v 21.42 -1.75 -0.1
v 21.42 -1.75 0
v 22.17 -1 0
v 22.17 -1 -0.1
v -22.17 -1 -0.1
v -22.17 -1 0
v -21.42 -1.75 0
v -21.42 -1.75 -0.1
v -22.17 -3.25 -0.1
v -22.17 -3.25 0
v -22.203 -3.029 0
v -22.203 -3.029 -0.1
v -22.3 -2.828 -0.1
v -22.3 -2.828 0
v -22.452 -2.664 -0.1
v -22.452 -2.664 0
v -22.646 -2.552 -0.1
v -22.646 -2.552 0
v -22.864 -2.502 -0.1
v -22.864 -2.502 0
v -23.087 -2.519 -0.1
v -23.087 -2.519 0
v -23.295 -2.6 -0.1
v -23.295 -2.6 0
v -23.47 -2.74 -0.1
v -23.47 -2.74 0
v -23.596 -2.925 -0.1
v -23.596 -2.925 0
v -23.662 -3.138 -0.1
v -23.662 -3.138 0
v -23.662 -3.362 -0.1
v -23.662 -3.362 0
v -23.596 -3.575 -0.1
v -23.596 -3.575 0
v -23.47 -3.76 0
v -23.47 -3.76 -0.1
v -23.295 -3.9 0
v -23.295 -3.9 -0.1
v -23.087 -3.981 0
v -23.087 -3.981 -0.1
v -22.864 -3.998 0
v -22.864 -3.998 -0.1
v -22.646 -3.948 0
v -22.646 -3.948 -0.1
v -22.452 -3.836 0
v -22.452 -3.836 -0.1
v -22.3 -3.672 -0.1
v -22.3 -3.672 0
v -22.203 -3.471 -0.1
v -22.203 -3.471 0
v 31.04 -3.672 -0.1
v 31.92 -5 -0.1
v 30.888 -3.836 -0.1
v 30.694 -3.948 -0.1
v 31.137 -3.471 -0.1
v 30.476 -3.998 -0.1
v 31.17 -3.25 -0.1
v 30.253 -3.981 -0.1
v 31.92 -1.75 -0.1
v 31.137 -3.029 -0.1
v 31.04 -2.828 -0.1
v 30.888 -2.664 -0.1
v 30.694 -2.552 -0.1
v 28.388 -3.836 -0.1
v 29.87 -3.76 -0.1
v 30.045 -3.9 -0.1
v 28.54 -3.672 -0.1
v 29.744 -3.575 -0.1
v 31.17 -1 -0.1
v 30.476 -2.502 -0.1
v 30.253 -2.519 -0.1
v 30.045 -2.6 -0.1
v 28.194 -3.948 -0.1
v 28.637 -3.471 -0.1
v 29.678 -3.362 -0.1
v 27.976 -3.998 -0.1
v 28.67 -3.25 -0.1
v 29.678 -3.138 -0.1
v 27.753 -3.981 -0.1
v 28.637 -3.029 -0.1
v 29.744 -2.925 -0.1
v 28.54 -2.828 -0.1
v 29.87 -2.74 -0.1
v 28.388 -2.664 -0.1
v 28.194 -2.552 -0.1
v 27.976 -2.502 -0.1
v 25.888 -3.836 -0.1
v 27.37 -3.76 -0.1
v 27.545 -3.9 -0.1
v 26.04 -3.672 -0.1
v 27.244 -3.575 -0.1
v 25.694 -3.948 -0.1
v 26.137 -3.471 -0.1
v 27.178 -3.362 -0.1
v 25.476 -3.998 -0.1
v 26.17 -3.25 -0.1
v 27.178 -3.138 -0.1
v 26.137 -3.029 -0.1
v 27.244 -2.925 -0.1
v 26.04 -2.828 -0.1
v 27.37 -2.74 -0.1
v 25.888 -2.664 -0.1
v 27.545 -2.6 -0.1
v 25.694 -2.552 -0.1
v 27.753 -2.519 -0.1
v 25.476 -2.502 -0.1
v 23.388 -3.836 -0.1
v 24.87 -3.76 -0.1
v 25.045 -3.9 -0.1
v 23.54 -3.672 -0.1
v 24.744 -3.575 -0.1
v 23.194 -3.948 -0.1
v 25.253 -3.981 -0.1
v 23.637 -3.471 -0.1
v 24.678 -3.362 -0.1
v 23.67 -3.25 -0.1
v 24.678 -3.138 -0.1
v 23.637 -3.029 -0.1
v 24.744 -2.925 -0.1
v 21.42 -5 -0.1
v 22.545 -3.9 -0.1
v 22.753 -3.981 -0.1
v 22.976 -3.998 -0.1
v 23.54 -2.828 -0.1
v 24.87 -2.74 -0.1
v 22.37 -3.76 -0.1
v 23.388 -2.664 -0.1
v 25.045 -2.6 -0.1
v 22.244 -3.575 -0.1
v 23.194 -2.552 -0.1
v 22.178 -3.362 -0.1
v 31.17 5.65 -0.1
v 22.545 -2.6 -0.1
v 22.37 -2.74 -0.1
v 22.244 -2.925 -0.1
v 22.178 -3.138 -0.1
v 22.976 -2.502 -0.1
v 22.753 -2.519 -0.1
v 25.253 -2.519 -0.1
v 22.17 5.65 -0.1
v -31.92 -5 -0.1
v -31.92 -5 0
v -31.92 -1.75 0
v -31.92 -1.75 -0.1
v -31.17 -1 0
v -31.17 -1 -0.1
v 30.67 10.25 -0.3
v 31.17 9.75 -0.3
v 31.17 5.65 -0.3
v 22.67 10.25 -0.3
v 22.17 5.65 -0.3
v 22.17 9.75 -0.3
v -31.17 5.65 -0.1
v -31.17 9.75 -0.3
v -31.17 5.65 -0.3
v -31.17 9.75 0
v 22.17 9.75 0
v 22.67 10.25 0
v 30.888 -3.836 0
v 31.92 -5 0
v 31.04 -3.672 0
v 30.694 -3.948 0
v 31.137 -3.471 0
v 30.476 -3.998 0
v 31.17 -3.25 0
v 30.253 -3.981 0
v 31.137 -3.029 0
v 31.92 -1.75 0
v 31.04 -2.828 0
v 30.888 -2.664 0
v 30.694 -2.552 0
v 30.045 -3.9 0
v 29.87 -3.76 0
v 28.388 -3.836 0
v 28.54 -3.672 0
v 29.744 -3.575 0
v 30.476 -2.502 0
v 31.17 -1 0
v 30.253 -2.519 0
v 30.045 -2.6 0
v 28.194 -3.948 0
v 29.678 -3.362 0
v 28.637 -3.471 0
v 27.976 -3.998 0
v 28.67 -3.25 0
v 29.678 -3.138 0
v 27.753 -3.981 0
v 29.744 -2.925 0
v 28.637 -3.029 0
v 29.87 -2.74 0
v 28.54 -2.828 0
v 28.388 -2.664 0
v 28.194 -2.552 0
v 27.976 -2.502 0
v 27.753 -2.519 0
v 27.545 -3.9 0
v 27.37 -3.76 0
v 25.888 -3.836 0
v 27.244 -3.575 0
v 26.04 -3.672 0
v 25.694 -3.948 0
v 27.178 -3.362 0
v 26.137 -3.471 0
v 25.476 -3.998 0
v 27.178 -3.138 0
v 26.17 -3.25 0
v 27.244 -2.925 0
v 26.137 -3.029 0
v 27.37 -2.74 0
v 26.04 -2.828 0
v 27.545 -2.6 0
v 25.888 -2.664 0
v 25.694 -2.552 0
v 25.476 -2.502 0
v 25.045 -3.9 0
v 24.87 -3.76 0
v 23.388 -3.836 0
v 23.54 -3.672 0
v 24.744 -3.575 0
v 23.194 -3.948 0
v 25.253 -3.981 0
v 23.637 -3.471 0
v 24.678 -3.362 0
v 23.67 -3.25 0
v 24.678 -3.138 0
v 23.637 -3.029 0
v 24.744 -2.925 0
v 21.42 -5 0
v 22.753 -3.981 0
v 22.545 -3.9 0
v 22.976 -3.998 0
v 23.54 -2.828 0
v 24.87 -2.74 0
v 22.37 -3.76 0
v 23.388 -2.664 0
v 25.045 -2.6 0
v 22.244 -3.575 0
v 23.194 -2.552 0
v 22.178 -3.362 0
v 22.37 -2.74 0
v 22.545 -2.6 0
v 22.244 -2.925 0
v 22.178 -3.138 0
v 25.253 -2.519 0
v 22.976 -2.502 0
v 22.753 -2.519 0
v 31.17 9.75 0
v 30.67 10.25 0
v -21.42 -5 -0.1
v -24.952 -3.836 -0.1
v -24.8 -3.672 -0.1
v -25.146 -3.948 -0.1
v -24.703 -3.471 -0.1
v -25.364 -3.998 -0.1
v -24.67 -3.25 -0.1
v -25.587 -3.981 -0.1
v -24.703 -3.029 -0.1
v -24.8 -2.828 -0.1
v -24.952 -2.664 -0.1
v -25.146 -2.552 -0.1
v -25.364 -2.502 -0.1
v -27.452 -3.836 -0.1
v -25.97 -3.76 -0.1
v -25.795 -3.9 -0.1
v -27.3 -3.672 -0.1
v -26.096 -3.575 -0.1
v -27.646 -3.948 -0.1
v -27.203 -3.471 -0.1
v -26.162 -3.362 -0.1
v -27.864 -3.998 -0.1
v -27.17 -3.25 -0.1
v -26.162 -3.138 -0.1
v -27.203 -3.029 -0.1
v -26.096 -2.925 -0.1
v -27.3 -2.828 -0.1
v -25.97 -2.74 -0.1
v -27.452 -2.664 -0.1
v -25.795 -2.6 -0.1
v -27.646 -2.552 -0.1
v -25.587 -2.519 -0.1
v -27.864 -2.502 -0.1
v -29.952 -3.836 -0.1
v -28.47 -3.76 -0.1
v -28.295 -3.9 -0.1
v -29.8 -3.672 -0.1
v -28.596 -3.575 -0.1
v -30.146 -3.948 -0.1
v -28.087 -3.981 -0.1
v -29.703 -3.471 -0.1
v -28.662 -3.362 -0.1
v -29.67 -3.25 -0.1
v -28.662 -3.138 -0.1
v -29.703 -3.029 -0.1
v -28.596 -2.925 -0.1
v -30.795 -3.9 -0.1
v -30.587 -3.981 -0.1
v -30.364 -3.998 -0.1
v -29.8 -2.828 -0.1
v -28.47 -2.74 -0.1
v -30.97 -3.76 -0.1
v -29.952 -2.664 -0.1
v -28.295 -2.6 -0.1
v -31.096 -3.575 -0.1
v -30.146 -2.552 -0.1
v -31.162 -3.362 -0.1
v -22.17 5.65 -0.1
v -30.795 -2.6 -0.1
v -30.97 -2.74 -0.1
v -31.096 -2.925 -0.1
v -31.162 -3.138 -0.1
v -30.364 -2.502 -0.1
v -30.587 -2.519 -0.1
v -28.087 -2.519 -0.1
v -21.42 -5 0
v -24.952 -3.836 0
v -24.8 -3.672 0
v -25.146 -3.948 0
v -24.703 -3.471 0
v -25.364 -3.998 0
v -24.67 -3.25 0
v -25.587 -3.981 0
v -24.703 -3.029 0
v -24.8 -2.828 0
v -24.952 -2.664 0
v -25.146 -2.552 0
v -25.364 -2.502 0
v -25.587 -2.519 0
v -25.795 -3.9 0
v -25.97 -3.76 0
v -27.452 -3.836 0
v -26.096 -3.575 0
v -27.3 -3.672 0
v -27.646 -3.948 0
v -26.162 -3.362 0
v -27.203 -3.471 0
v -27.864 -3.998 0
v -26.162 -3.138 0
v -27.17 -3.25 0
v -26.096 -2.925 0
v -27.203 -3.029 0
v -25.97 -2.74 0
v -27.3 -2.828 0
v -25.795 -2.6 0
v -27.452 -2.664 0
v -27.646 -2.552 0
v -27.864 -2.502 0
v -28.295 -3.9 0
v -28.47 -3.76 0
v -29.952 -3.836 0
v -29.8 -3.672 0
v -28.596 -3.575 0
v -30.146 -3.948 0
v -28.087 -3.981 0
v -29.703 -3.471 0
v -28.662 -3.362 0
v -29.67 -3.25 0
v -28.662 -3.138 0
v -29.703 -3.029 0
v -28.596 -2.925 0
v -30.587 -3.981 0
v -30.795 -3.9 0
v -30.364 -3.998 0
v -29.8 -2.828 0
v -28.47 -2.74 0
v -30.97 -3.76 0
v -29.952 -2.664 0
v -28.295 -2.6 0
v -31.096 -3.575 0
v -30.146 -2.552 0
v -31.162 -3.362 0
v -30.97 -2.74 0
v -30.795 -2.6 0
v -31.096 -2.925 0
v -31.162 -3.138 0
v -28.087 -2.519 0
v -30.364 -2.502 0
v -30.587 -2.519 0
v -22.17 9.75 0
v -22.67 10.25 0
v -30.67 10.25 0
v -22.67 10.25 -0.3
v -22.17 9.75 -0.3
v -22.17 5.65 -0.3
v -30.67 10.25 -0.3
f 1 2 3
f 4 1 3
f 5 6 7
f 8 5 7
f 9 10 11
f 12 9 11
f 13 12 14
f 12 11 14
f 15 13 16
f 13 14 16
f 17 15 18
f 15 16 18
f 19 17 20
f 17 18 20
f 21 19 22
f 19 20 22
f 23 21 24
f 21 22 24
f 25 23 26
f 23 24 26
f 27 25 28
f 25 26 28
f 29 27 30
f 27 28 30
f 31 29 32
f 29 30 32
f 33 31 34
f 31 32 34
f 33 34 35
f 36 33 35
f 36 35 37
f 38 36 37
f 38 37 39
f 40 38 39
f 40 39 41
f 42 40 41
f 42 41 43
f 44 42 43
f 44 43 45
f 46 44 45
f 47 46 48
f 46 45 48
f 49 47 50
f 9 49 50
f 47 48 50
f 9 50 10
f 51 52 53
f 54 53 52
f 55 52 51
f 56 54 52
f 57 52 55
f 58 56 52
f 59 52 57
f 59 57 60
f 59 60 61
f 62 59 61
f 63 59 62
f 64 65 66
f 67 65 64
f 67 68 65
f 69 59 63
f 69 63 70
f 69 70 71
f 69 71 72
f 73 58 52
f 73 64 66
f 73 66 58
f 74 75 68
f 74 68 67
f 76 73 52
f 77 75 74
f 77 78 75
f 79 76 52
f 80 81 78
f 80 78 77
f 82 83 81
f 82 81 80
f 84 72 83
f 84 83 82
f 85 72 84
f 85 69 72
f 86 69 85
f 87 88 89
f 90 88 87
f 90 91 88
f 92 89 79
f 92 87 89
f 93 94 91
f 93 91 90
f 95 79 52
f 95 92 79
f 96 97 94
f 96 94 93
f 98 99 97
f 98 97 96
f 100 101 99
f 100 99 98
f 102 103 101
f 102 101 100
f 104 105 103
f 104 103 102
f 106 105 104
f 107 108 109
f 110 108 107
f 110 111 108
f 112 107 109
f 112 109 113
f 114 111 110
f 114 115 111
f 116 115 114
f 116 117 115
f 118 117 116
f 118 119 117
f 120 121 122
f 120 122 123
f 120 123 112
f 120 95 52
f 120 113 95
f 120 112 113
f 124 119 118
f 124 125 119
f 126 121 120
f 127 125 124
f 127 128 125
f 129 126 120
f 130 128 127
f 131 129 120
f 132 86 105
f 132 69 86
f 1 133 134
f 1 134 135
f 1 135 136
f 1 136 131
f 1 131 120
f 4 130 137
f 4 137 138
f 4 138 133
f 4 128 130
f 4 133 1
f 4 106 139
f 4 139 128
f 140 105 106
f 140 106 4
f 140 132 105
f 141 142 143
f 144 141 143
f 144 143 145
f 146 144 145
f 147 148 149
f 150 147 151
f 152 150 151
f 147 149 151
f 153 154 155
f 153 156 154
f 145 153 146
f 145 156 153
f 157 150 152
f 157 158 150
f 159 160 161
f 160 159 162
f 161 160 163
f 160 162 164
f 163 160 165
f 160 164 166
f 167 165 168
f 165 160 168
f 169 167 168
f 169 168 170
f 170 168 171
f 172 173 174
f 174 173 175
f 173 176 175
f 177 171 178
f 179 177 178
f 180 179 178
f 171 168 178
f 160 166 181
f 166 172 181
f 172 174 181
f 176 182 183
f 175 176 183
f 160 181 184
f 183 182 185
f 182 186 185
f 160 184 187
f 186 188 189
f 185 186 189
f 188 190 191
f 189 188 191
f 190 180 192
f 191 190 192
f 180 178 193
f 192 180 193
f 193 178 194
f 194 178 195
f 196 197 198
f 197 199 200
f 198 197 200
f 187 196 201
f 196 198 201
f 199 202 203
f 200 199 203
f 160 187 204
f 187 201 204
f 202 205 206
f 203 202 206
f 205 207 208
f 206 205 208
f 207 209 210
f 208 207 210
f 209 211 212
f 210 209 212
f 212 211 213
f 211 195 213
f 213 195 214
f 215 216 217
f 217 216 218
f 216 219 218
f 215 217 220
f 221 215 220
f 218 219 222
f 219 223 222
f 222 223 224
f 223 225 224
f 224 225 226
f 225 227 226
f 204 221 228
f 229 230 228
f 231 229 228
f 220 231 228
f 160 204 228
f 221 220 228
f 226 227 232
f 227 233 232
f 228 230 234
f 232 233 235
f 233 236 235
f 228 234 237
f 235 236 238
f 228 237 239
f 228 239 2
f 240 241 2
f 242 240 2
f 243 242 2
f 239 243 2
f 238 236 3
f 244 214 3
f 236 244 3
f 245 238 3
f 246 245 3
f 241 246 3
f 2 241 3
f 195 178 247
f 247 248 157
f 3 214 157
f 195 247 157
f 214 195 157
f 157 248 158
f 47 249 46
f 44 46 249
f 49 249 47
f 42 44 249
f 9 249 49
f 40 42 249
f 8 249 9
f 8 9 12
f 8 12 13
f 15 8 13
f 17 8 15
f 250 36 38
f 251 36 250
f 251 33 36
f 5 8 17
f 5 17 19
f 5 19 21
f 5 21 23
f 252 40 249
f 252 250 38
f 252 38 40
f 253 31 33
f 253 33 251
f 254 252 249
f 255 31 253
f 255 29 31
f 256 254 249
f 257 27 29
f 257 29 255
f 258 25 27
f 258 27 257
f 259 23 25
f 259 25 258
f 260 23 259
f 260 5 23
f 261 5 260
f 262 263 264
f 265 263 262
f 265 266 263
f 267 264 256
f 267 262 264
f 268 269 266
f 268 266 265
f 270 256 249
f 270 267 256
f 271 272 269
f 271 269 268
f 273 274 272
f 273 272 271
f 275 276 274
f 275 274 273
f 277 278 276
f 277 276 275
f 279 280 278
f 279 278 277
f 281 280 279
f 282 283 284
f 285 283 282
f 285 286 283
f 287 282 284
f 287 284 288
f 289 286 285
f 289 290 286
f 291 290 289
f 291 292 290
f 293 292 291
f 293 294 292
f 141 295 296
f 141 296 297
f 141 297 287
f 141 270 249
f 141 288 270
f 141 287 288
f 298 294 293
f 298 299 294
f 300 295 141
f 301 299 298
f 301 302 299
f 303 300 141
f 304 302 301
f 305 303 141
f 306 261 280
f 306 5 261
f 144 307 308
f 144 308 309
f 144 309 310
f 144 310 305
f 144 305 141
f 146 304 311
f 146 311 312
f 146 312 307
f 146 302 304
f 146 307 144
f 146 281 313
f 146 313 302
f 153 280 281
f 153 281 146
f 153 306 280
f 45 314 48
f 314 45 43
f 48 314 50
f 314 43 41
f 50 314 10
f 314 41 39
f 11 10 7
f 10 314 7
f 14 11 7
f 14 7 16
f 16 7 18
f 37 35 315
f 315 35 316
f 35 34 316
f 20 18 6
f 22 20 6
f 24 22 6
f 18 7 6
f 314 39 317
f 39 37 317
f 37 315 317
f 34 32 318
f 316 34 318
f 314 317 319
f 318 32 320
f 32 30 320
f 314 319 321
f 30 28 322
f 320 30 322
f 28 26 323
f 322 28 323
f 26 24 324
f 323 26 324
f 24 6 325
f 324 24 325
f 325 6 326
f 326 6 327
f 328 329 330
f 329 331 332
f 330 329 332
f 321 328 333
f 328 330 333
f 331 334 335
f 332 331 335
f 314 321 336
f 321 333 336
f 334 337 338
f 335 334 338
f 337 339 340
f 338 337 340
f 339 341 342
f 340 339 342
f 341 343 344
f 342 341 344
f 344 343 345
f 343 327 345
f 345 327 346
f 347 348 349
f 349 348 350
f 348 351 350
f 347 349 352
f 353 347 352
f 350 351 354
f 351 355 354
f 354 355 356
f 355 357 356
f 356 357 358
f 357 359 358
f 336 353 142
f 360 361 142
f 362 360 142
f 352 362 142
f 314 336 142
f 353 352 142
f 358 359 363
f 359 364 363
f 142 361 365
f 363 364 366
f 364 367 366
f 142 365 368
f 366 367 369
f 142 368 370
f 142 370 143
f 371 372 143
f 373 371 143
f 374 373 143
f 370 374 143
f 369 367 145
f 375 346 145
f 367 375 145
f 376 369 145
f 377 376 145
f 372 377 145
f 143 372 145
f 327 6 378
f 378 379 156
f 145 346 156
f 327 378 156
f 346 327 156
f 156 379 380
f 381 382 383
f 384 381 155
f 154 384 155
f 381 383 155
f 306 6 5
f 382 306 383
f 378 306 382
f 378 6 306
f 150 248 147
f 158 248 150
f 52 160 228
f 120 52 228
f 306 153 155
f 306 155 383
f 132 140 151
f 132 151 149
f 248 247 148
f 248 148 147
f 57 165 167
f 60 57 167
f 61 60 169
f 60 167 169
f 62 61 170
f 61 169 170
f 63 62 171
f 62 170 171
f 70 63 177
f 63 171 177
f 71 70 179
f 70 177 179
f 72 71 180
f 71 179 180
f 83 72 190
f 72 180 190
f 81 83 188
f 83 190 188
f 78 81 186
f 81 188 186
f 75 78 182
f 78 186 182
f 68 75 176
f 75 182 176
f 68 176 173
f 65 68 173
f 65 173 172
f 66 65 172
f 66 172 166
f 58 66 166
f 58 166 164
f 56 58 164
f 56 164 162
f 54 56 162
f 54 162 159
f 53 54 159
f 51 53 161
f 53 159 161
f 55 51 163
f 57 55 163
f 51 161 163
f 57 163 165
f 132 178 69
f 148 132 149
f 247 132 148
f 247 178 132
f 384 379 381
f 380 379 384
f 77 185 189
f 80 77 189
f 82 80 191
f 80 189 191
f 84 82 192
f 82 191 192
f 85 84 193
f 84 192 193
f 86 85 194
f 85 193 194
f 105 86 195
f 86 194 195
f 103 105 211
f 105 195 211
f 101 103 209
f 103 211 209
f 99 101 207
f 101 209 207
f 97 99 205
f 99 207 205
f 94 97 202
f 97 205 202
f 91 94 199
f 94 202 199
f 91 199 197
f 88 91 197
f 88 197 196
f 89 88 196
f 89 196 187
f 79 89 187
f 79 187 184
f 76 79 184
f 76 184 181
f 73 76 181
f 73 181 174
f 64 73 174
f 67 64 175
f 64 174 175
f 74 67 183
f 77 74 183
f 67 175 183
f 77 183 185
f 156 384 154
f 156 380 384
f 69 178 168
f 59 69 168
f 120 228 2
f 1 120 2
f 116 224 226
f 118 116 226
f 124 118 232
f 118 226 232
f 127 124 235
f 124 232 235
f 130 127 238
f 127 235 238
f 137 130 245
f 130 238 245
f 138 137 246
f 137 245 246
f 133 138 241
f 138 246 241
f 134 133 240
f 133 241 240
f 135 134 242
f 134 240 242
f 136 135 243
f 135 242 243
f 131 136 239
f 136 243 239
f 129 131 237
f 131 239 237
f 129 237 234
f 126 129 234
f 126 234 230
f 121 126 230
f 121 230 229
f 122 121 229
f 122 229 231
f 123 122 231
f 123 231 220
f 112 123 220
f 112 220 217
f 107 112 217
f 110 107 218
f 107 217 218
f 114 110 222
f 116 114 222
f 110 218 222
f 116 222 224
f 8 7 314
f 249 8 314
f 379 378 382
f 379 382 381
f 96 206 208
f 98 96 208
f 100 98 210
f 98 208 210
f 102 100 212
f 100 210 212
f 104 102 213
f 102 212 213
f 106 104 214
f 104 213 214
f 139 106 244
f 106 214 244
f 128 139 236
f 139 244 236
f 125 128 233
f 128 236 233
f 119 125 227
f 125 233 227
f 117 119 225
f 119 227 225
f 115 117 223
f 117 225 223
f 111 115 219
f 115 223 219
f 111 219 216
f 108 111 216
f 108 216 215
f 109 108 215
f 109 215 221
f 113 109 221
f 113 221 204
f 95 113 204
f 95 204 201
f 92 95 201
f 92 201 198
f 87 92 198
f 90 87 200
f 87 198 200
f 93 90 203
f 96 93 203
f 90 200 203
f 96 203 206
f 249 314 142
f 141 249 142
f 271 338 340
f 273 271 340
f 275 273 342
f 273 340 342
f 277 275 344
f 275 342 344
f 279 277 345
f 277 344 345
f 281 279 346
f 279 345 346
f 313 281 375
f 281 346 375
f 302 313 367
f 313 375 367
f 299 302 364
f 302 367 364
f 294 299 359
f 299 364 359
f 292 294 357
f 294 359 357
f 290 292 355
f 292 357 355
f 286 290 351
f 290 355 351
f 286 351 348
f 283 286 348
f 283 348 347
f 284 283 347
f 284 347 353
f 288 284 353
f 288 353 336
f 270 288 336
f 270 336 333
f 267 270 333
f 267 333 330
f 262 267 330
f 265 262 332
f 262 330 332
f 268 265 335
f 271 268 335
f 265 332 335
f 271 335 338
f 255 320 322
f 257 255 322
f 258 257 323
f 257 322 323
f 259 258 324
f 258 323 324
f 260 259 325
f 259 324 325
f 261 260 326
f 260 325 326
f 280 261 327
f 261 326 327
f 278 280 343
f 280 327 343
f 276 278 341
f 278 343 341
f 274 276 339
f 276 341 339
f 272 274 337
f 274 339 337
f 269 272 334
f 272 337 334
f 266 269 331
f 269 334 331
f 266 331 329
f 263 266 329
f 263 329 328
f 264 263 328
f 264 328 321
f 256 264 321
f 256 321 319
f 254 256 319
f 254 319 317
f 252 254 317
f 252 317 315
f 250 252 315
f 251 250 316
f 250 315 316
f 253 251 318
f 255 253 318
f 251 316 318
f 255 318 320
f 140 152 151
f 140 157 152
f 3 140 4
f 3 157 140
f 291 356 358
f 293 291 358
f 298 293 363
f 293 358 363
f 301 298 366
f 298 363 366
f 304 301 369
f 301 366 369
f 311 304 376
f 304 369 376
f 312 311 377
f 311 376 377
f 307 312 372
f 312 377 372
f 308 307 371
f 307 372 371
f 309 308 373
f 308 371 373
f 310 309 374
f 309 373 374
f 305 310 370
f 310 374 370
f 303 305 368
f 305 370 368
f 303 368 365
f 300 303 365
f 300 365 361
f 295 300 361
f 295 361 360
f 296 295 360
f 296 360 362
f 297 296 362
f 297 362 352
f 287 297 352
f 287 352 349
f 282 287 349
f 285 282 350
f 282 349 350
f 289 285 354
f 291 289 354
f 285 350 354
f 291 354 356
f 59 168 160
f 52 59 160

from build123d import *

# Parameters (mm, degrees)
SKETCH_R     = 0.75
PAD_DEPTH    = 0.1
PAD001_DEPTH = 0.2
SKETCH002_R  = 0.75
PAD002_DEPTH = 0.1
PAD003_DEPTH = 0.2


with BuildPart() as feature_ffc_cutout_a:
    # Sketch → Pad (new body)
    with BuildSketch(Plane.XY):
        Polygon((22.17, -1), (22.17, 9.75), (22.67, 10.25), (30.67, 10.25), (31.17, 9.75), (31.17, -1), (31.92, -1.75), (31.92, -5), (21.42, -5), (21.42, -1.75), align=None)
        with Locations((22.92, -3.25)):
            Circle(SKETCH_R, mode=Mode.SUBTRACT)
        with Locations((25.42, -3.25)):
            Circle(SKETCH_R, mode=Mode.SUBTRACT)
        with Locations((27.92, -3.25)):
            Circle(SKETCH_R, mode=Mode.SUBTRACT)
        with Locations((30.42, -3.25)):
            Circle(SKETCH_R, mode=Mode.SUBTRACT)
    extrude(amount=-PAD_DEPTH)

    # Sketch001 (on Face16 of Pad) → Pad001 (join)
    with BuildSketch(Plane(origin=(0, 0, -0.1), x_dir=(1, 0, 0), z_dir=(0, 0, -1))):
        Polygon((22.17, -9.75), (22.17, -5.65), (31.17, -5.65), (31.17, -9.75), (30.67, -10.25), (22.67, -10.25), align=None)
    extrude(amount=PAD001_DEPTH)


with BuildPart() as feature_ffc_cutout_b:
    # Sketch002 → Pad002 (new body)
    with BuildSketch(Plane.XY):
        Polygon((-31.17, -1), (-31.17, 9.75), (-30.67, 10.25), (-22.67, 10.25), (-22.17, 9.75), (-22.17, -1), (-21.42, -1.75), (-21.42, -5), (-31.92, -5), (-31.92, -1.75), align=None)
        with Locations((-30.42, -3.25)):
            Circle(SKETCH002_R, mode=Mode.SUBTRACT)
        with Locations((-27.92, -3.25)):
            Circle(SKETCH002_R, mode=Mode.SUBTRACT)
        with Locations((-25.42, -3.25)):
            Circle(SKETCH002_R, mode=Mode.SUBTRACT)
        with Locations((-22.92, -3.25)):
            Circle(SKETCH002_R, mode=Mode.SUBTRACT)
    extrude(amount=-PAD002_DEPTH)

    # Sketch003 (on Face16 of Pad002) → Pad003 (join)
    with BuildSketch(Plane(origin=(0, 0, -0.1), x_dir=(1, 0, 0), z_dir=(0, 0, -1))):
        Polygon((-31.17, -9.75), (-31.17, -5.65), (-22.17, -5.65), (-22.17, -9.75), (-22.67, -10.25), (-30.67, -10.25), align=None)
    extrude(amount=PAD003_DEPTH)


solid = Compound([feature_ffc_cutout_a.part, feature_ffc_cutout_b.part])
